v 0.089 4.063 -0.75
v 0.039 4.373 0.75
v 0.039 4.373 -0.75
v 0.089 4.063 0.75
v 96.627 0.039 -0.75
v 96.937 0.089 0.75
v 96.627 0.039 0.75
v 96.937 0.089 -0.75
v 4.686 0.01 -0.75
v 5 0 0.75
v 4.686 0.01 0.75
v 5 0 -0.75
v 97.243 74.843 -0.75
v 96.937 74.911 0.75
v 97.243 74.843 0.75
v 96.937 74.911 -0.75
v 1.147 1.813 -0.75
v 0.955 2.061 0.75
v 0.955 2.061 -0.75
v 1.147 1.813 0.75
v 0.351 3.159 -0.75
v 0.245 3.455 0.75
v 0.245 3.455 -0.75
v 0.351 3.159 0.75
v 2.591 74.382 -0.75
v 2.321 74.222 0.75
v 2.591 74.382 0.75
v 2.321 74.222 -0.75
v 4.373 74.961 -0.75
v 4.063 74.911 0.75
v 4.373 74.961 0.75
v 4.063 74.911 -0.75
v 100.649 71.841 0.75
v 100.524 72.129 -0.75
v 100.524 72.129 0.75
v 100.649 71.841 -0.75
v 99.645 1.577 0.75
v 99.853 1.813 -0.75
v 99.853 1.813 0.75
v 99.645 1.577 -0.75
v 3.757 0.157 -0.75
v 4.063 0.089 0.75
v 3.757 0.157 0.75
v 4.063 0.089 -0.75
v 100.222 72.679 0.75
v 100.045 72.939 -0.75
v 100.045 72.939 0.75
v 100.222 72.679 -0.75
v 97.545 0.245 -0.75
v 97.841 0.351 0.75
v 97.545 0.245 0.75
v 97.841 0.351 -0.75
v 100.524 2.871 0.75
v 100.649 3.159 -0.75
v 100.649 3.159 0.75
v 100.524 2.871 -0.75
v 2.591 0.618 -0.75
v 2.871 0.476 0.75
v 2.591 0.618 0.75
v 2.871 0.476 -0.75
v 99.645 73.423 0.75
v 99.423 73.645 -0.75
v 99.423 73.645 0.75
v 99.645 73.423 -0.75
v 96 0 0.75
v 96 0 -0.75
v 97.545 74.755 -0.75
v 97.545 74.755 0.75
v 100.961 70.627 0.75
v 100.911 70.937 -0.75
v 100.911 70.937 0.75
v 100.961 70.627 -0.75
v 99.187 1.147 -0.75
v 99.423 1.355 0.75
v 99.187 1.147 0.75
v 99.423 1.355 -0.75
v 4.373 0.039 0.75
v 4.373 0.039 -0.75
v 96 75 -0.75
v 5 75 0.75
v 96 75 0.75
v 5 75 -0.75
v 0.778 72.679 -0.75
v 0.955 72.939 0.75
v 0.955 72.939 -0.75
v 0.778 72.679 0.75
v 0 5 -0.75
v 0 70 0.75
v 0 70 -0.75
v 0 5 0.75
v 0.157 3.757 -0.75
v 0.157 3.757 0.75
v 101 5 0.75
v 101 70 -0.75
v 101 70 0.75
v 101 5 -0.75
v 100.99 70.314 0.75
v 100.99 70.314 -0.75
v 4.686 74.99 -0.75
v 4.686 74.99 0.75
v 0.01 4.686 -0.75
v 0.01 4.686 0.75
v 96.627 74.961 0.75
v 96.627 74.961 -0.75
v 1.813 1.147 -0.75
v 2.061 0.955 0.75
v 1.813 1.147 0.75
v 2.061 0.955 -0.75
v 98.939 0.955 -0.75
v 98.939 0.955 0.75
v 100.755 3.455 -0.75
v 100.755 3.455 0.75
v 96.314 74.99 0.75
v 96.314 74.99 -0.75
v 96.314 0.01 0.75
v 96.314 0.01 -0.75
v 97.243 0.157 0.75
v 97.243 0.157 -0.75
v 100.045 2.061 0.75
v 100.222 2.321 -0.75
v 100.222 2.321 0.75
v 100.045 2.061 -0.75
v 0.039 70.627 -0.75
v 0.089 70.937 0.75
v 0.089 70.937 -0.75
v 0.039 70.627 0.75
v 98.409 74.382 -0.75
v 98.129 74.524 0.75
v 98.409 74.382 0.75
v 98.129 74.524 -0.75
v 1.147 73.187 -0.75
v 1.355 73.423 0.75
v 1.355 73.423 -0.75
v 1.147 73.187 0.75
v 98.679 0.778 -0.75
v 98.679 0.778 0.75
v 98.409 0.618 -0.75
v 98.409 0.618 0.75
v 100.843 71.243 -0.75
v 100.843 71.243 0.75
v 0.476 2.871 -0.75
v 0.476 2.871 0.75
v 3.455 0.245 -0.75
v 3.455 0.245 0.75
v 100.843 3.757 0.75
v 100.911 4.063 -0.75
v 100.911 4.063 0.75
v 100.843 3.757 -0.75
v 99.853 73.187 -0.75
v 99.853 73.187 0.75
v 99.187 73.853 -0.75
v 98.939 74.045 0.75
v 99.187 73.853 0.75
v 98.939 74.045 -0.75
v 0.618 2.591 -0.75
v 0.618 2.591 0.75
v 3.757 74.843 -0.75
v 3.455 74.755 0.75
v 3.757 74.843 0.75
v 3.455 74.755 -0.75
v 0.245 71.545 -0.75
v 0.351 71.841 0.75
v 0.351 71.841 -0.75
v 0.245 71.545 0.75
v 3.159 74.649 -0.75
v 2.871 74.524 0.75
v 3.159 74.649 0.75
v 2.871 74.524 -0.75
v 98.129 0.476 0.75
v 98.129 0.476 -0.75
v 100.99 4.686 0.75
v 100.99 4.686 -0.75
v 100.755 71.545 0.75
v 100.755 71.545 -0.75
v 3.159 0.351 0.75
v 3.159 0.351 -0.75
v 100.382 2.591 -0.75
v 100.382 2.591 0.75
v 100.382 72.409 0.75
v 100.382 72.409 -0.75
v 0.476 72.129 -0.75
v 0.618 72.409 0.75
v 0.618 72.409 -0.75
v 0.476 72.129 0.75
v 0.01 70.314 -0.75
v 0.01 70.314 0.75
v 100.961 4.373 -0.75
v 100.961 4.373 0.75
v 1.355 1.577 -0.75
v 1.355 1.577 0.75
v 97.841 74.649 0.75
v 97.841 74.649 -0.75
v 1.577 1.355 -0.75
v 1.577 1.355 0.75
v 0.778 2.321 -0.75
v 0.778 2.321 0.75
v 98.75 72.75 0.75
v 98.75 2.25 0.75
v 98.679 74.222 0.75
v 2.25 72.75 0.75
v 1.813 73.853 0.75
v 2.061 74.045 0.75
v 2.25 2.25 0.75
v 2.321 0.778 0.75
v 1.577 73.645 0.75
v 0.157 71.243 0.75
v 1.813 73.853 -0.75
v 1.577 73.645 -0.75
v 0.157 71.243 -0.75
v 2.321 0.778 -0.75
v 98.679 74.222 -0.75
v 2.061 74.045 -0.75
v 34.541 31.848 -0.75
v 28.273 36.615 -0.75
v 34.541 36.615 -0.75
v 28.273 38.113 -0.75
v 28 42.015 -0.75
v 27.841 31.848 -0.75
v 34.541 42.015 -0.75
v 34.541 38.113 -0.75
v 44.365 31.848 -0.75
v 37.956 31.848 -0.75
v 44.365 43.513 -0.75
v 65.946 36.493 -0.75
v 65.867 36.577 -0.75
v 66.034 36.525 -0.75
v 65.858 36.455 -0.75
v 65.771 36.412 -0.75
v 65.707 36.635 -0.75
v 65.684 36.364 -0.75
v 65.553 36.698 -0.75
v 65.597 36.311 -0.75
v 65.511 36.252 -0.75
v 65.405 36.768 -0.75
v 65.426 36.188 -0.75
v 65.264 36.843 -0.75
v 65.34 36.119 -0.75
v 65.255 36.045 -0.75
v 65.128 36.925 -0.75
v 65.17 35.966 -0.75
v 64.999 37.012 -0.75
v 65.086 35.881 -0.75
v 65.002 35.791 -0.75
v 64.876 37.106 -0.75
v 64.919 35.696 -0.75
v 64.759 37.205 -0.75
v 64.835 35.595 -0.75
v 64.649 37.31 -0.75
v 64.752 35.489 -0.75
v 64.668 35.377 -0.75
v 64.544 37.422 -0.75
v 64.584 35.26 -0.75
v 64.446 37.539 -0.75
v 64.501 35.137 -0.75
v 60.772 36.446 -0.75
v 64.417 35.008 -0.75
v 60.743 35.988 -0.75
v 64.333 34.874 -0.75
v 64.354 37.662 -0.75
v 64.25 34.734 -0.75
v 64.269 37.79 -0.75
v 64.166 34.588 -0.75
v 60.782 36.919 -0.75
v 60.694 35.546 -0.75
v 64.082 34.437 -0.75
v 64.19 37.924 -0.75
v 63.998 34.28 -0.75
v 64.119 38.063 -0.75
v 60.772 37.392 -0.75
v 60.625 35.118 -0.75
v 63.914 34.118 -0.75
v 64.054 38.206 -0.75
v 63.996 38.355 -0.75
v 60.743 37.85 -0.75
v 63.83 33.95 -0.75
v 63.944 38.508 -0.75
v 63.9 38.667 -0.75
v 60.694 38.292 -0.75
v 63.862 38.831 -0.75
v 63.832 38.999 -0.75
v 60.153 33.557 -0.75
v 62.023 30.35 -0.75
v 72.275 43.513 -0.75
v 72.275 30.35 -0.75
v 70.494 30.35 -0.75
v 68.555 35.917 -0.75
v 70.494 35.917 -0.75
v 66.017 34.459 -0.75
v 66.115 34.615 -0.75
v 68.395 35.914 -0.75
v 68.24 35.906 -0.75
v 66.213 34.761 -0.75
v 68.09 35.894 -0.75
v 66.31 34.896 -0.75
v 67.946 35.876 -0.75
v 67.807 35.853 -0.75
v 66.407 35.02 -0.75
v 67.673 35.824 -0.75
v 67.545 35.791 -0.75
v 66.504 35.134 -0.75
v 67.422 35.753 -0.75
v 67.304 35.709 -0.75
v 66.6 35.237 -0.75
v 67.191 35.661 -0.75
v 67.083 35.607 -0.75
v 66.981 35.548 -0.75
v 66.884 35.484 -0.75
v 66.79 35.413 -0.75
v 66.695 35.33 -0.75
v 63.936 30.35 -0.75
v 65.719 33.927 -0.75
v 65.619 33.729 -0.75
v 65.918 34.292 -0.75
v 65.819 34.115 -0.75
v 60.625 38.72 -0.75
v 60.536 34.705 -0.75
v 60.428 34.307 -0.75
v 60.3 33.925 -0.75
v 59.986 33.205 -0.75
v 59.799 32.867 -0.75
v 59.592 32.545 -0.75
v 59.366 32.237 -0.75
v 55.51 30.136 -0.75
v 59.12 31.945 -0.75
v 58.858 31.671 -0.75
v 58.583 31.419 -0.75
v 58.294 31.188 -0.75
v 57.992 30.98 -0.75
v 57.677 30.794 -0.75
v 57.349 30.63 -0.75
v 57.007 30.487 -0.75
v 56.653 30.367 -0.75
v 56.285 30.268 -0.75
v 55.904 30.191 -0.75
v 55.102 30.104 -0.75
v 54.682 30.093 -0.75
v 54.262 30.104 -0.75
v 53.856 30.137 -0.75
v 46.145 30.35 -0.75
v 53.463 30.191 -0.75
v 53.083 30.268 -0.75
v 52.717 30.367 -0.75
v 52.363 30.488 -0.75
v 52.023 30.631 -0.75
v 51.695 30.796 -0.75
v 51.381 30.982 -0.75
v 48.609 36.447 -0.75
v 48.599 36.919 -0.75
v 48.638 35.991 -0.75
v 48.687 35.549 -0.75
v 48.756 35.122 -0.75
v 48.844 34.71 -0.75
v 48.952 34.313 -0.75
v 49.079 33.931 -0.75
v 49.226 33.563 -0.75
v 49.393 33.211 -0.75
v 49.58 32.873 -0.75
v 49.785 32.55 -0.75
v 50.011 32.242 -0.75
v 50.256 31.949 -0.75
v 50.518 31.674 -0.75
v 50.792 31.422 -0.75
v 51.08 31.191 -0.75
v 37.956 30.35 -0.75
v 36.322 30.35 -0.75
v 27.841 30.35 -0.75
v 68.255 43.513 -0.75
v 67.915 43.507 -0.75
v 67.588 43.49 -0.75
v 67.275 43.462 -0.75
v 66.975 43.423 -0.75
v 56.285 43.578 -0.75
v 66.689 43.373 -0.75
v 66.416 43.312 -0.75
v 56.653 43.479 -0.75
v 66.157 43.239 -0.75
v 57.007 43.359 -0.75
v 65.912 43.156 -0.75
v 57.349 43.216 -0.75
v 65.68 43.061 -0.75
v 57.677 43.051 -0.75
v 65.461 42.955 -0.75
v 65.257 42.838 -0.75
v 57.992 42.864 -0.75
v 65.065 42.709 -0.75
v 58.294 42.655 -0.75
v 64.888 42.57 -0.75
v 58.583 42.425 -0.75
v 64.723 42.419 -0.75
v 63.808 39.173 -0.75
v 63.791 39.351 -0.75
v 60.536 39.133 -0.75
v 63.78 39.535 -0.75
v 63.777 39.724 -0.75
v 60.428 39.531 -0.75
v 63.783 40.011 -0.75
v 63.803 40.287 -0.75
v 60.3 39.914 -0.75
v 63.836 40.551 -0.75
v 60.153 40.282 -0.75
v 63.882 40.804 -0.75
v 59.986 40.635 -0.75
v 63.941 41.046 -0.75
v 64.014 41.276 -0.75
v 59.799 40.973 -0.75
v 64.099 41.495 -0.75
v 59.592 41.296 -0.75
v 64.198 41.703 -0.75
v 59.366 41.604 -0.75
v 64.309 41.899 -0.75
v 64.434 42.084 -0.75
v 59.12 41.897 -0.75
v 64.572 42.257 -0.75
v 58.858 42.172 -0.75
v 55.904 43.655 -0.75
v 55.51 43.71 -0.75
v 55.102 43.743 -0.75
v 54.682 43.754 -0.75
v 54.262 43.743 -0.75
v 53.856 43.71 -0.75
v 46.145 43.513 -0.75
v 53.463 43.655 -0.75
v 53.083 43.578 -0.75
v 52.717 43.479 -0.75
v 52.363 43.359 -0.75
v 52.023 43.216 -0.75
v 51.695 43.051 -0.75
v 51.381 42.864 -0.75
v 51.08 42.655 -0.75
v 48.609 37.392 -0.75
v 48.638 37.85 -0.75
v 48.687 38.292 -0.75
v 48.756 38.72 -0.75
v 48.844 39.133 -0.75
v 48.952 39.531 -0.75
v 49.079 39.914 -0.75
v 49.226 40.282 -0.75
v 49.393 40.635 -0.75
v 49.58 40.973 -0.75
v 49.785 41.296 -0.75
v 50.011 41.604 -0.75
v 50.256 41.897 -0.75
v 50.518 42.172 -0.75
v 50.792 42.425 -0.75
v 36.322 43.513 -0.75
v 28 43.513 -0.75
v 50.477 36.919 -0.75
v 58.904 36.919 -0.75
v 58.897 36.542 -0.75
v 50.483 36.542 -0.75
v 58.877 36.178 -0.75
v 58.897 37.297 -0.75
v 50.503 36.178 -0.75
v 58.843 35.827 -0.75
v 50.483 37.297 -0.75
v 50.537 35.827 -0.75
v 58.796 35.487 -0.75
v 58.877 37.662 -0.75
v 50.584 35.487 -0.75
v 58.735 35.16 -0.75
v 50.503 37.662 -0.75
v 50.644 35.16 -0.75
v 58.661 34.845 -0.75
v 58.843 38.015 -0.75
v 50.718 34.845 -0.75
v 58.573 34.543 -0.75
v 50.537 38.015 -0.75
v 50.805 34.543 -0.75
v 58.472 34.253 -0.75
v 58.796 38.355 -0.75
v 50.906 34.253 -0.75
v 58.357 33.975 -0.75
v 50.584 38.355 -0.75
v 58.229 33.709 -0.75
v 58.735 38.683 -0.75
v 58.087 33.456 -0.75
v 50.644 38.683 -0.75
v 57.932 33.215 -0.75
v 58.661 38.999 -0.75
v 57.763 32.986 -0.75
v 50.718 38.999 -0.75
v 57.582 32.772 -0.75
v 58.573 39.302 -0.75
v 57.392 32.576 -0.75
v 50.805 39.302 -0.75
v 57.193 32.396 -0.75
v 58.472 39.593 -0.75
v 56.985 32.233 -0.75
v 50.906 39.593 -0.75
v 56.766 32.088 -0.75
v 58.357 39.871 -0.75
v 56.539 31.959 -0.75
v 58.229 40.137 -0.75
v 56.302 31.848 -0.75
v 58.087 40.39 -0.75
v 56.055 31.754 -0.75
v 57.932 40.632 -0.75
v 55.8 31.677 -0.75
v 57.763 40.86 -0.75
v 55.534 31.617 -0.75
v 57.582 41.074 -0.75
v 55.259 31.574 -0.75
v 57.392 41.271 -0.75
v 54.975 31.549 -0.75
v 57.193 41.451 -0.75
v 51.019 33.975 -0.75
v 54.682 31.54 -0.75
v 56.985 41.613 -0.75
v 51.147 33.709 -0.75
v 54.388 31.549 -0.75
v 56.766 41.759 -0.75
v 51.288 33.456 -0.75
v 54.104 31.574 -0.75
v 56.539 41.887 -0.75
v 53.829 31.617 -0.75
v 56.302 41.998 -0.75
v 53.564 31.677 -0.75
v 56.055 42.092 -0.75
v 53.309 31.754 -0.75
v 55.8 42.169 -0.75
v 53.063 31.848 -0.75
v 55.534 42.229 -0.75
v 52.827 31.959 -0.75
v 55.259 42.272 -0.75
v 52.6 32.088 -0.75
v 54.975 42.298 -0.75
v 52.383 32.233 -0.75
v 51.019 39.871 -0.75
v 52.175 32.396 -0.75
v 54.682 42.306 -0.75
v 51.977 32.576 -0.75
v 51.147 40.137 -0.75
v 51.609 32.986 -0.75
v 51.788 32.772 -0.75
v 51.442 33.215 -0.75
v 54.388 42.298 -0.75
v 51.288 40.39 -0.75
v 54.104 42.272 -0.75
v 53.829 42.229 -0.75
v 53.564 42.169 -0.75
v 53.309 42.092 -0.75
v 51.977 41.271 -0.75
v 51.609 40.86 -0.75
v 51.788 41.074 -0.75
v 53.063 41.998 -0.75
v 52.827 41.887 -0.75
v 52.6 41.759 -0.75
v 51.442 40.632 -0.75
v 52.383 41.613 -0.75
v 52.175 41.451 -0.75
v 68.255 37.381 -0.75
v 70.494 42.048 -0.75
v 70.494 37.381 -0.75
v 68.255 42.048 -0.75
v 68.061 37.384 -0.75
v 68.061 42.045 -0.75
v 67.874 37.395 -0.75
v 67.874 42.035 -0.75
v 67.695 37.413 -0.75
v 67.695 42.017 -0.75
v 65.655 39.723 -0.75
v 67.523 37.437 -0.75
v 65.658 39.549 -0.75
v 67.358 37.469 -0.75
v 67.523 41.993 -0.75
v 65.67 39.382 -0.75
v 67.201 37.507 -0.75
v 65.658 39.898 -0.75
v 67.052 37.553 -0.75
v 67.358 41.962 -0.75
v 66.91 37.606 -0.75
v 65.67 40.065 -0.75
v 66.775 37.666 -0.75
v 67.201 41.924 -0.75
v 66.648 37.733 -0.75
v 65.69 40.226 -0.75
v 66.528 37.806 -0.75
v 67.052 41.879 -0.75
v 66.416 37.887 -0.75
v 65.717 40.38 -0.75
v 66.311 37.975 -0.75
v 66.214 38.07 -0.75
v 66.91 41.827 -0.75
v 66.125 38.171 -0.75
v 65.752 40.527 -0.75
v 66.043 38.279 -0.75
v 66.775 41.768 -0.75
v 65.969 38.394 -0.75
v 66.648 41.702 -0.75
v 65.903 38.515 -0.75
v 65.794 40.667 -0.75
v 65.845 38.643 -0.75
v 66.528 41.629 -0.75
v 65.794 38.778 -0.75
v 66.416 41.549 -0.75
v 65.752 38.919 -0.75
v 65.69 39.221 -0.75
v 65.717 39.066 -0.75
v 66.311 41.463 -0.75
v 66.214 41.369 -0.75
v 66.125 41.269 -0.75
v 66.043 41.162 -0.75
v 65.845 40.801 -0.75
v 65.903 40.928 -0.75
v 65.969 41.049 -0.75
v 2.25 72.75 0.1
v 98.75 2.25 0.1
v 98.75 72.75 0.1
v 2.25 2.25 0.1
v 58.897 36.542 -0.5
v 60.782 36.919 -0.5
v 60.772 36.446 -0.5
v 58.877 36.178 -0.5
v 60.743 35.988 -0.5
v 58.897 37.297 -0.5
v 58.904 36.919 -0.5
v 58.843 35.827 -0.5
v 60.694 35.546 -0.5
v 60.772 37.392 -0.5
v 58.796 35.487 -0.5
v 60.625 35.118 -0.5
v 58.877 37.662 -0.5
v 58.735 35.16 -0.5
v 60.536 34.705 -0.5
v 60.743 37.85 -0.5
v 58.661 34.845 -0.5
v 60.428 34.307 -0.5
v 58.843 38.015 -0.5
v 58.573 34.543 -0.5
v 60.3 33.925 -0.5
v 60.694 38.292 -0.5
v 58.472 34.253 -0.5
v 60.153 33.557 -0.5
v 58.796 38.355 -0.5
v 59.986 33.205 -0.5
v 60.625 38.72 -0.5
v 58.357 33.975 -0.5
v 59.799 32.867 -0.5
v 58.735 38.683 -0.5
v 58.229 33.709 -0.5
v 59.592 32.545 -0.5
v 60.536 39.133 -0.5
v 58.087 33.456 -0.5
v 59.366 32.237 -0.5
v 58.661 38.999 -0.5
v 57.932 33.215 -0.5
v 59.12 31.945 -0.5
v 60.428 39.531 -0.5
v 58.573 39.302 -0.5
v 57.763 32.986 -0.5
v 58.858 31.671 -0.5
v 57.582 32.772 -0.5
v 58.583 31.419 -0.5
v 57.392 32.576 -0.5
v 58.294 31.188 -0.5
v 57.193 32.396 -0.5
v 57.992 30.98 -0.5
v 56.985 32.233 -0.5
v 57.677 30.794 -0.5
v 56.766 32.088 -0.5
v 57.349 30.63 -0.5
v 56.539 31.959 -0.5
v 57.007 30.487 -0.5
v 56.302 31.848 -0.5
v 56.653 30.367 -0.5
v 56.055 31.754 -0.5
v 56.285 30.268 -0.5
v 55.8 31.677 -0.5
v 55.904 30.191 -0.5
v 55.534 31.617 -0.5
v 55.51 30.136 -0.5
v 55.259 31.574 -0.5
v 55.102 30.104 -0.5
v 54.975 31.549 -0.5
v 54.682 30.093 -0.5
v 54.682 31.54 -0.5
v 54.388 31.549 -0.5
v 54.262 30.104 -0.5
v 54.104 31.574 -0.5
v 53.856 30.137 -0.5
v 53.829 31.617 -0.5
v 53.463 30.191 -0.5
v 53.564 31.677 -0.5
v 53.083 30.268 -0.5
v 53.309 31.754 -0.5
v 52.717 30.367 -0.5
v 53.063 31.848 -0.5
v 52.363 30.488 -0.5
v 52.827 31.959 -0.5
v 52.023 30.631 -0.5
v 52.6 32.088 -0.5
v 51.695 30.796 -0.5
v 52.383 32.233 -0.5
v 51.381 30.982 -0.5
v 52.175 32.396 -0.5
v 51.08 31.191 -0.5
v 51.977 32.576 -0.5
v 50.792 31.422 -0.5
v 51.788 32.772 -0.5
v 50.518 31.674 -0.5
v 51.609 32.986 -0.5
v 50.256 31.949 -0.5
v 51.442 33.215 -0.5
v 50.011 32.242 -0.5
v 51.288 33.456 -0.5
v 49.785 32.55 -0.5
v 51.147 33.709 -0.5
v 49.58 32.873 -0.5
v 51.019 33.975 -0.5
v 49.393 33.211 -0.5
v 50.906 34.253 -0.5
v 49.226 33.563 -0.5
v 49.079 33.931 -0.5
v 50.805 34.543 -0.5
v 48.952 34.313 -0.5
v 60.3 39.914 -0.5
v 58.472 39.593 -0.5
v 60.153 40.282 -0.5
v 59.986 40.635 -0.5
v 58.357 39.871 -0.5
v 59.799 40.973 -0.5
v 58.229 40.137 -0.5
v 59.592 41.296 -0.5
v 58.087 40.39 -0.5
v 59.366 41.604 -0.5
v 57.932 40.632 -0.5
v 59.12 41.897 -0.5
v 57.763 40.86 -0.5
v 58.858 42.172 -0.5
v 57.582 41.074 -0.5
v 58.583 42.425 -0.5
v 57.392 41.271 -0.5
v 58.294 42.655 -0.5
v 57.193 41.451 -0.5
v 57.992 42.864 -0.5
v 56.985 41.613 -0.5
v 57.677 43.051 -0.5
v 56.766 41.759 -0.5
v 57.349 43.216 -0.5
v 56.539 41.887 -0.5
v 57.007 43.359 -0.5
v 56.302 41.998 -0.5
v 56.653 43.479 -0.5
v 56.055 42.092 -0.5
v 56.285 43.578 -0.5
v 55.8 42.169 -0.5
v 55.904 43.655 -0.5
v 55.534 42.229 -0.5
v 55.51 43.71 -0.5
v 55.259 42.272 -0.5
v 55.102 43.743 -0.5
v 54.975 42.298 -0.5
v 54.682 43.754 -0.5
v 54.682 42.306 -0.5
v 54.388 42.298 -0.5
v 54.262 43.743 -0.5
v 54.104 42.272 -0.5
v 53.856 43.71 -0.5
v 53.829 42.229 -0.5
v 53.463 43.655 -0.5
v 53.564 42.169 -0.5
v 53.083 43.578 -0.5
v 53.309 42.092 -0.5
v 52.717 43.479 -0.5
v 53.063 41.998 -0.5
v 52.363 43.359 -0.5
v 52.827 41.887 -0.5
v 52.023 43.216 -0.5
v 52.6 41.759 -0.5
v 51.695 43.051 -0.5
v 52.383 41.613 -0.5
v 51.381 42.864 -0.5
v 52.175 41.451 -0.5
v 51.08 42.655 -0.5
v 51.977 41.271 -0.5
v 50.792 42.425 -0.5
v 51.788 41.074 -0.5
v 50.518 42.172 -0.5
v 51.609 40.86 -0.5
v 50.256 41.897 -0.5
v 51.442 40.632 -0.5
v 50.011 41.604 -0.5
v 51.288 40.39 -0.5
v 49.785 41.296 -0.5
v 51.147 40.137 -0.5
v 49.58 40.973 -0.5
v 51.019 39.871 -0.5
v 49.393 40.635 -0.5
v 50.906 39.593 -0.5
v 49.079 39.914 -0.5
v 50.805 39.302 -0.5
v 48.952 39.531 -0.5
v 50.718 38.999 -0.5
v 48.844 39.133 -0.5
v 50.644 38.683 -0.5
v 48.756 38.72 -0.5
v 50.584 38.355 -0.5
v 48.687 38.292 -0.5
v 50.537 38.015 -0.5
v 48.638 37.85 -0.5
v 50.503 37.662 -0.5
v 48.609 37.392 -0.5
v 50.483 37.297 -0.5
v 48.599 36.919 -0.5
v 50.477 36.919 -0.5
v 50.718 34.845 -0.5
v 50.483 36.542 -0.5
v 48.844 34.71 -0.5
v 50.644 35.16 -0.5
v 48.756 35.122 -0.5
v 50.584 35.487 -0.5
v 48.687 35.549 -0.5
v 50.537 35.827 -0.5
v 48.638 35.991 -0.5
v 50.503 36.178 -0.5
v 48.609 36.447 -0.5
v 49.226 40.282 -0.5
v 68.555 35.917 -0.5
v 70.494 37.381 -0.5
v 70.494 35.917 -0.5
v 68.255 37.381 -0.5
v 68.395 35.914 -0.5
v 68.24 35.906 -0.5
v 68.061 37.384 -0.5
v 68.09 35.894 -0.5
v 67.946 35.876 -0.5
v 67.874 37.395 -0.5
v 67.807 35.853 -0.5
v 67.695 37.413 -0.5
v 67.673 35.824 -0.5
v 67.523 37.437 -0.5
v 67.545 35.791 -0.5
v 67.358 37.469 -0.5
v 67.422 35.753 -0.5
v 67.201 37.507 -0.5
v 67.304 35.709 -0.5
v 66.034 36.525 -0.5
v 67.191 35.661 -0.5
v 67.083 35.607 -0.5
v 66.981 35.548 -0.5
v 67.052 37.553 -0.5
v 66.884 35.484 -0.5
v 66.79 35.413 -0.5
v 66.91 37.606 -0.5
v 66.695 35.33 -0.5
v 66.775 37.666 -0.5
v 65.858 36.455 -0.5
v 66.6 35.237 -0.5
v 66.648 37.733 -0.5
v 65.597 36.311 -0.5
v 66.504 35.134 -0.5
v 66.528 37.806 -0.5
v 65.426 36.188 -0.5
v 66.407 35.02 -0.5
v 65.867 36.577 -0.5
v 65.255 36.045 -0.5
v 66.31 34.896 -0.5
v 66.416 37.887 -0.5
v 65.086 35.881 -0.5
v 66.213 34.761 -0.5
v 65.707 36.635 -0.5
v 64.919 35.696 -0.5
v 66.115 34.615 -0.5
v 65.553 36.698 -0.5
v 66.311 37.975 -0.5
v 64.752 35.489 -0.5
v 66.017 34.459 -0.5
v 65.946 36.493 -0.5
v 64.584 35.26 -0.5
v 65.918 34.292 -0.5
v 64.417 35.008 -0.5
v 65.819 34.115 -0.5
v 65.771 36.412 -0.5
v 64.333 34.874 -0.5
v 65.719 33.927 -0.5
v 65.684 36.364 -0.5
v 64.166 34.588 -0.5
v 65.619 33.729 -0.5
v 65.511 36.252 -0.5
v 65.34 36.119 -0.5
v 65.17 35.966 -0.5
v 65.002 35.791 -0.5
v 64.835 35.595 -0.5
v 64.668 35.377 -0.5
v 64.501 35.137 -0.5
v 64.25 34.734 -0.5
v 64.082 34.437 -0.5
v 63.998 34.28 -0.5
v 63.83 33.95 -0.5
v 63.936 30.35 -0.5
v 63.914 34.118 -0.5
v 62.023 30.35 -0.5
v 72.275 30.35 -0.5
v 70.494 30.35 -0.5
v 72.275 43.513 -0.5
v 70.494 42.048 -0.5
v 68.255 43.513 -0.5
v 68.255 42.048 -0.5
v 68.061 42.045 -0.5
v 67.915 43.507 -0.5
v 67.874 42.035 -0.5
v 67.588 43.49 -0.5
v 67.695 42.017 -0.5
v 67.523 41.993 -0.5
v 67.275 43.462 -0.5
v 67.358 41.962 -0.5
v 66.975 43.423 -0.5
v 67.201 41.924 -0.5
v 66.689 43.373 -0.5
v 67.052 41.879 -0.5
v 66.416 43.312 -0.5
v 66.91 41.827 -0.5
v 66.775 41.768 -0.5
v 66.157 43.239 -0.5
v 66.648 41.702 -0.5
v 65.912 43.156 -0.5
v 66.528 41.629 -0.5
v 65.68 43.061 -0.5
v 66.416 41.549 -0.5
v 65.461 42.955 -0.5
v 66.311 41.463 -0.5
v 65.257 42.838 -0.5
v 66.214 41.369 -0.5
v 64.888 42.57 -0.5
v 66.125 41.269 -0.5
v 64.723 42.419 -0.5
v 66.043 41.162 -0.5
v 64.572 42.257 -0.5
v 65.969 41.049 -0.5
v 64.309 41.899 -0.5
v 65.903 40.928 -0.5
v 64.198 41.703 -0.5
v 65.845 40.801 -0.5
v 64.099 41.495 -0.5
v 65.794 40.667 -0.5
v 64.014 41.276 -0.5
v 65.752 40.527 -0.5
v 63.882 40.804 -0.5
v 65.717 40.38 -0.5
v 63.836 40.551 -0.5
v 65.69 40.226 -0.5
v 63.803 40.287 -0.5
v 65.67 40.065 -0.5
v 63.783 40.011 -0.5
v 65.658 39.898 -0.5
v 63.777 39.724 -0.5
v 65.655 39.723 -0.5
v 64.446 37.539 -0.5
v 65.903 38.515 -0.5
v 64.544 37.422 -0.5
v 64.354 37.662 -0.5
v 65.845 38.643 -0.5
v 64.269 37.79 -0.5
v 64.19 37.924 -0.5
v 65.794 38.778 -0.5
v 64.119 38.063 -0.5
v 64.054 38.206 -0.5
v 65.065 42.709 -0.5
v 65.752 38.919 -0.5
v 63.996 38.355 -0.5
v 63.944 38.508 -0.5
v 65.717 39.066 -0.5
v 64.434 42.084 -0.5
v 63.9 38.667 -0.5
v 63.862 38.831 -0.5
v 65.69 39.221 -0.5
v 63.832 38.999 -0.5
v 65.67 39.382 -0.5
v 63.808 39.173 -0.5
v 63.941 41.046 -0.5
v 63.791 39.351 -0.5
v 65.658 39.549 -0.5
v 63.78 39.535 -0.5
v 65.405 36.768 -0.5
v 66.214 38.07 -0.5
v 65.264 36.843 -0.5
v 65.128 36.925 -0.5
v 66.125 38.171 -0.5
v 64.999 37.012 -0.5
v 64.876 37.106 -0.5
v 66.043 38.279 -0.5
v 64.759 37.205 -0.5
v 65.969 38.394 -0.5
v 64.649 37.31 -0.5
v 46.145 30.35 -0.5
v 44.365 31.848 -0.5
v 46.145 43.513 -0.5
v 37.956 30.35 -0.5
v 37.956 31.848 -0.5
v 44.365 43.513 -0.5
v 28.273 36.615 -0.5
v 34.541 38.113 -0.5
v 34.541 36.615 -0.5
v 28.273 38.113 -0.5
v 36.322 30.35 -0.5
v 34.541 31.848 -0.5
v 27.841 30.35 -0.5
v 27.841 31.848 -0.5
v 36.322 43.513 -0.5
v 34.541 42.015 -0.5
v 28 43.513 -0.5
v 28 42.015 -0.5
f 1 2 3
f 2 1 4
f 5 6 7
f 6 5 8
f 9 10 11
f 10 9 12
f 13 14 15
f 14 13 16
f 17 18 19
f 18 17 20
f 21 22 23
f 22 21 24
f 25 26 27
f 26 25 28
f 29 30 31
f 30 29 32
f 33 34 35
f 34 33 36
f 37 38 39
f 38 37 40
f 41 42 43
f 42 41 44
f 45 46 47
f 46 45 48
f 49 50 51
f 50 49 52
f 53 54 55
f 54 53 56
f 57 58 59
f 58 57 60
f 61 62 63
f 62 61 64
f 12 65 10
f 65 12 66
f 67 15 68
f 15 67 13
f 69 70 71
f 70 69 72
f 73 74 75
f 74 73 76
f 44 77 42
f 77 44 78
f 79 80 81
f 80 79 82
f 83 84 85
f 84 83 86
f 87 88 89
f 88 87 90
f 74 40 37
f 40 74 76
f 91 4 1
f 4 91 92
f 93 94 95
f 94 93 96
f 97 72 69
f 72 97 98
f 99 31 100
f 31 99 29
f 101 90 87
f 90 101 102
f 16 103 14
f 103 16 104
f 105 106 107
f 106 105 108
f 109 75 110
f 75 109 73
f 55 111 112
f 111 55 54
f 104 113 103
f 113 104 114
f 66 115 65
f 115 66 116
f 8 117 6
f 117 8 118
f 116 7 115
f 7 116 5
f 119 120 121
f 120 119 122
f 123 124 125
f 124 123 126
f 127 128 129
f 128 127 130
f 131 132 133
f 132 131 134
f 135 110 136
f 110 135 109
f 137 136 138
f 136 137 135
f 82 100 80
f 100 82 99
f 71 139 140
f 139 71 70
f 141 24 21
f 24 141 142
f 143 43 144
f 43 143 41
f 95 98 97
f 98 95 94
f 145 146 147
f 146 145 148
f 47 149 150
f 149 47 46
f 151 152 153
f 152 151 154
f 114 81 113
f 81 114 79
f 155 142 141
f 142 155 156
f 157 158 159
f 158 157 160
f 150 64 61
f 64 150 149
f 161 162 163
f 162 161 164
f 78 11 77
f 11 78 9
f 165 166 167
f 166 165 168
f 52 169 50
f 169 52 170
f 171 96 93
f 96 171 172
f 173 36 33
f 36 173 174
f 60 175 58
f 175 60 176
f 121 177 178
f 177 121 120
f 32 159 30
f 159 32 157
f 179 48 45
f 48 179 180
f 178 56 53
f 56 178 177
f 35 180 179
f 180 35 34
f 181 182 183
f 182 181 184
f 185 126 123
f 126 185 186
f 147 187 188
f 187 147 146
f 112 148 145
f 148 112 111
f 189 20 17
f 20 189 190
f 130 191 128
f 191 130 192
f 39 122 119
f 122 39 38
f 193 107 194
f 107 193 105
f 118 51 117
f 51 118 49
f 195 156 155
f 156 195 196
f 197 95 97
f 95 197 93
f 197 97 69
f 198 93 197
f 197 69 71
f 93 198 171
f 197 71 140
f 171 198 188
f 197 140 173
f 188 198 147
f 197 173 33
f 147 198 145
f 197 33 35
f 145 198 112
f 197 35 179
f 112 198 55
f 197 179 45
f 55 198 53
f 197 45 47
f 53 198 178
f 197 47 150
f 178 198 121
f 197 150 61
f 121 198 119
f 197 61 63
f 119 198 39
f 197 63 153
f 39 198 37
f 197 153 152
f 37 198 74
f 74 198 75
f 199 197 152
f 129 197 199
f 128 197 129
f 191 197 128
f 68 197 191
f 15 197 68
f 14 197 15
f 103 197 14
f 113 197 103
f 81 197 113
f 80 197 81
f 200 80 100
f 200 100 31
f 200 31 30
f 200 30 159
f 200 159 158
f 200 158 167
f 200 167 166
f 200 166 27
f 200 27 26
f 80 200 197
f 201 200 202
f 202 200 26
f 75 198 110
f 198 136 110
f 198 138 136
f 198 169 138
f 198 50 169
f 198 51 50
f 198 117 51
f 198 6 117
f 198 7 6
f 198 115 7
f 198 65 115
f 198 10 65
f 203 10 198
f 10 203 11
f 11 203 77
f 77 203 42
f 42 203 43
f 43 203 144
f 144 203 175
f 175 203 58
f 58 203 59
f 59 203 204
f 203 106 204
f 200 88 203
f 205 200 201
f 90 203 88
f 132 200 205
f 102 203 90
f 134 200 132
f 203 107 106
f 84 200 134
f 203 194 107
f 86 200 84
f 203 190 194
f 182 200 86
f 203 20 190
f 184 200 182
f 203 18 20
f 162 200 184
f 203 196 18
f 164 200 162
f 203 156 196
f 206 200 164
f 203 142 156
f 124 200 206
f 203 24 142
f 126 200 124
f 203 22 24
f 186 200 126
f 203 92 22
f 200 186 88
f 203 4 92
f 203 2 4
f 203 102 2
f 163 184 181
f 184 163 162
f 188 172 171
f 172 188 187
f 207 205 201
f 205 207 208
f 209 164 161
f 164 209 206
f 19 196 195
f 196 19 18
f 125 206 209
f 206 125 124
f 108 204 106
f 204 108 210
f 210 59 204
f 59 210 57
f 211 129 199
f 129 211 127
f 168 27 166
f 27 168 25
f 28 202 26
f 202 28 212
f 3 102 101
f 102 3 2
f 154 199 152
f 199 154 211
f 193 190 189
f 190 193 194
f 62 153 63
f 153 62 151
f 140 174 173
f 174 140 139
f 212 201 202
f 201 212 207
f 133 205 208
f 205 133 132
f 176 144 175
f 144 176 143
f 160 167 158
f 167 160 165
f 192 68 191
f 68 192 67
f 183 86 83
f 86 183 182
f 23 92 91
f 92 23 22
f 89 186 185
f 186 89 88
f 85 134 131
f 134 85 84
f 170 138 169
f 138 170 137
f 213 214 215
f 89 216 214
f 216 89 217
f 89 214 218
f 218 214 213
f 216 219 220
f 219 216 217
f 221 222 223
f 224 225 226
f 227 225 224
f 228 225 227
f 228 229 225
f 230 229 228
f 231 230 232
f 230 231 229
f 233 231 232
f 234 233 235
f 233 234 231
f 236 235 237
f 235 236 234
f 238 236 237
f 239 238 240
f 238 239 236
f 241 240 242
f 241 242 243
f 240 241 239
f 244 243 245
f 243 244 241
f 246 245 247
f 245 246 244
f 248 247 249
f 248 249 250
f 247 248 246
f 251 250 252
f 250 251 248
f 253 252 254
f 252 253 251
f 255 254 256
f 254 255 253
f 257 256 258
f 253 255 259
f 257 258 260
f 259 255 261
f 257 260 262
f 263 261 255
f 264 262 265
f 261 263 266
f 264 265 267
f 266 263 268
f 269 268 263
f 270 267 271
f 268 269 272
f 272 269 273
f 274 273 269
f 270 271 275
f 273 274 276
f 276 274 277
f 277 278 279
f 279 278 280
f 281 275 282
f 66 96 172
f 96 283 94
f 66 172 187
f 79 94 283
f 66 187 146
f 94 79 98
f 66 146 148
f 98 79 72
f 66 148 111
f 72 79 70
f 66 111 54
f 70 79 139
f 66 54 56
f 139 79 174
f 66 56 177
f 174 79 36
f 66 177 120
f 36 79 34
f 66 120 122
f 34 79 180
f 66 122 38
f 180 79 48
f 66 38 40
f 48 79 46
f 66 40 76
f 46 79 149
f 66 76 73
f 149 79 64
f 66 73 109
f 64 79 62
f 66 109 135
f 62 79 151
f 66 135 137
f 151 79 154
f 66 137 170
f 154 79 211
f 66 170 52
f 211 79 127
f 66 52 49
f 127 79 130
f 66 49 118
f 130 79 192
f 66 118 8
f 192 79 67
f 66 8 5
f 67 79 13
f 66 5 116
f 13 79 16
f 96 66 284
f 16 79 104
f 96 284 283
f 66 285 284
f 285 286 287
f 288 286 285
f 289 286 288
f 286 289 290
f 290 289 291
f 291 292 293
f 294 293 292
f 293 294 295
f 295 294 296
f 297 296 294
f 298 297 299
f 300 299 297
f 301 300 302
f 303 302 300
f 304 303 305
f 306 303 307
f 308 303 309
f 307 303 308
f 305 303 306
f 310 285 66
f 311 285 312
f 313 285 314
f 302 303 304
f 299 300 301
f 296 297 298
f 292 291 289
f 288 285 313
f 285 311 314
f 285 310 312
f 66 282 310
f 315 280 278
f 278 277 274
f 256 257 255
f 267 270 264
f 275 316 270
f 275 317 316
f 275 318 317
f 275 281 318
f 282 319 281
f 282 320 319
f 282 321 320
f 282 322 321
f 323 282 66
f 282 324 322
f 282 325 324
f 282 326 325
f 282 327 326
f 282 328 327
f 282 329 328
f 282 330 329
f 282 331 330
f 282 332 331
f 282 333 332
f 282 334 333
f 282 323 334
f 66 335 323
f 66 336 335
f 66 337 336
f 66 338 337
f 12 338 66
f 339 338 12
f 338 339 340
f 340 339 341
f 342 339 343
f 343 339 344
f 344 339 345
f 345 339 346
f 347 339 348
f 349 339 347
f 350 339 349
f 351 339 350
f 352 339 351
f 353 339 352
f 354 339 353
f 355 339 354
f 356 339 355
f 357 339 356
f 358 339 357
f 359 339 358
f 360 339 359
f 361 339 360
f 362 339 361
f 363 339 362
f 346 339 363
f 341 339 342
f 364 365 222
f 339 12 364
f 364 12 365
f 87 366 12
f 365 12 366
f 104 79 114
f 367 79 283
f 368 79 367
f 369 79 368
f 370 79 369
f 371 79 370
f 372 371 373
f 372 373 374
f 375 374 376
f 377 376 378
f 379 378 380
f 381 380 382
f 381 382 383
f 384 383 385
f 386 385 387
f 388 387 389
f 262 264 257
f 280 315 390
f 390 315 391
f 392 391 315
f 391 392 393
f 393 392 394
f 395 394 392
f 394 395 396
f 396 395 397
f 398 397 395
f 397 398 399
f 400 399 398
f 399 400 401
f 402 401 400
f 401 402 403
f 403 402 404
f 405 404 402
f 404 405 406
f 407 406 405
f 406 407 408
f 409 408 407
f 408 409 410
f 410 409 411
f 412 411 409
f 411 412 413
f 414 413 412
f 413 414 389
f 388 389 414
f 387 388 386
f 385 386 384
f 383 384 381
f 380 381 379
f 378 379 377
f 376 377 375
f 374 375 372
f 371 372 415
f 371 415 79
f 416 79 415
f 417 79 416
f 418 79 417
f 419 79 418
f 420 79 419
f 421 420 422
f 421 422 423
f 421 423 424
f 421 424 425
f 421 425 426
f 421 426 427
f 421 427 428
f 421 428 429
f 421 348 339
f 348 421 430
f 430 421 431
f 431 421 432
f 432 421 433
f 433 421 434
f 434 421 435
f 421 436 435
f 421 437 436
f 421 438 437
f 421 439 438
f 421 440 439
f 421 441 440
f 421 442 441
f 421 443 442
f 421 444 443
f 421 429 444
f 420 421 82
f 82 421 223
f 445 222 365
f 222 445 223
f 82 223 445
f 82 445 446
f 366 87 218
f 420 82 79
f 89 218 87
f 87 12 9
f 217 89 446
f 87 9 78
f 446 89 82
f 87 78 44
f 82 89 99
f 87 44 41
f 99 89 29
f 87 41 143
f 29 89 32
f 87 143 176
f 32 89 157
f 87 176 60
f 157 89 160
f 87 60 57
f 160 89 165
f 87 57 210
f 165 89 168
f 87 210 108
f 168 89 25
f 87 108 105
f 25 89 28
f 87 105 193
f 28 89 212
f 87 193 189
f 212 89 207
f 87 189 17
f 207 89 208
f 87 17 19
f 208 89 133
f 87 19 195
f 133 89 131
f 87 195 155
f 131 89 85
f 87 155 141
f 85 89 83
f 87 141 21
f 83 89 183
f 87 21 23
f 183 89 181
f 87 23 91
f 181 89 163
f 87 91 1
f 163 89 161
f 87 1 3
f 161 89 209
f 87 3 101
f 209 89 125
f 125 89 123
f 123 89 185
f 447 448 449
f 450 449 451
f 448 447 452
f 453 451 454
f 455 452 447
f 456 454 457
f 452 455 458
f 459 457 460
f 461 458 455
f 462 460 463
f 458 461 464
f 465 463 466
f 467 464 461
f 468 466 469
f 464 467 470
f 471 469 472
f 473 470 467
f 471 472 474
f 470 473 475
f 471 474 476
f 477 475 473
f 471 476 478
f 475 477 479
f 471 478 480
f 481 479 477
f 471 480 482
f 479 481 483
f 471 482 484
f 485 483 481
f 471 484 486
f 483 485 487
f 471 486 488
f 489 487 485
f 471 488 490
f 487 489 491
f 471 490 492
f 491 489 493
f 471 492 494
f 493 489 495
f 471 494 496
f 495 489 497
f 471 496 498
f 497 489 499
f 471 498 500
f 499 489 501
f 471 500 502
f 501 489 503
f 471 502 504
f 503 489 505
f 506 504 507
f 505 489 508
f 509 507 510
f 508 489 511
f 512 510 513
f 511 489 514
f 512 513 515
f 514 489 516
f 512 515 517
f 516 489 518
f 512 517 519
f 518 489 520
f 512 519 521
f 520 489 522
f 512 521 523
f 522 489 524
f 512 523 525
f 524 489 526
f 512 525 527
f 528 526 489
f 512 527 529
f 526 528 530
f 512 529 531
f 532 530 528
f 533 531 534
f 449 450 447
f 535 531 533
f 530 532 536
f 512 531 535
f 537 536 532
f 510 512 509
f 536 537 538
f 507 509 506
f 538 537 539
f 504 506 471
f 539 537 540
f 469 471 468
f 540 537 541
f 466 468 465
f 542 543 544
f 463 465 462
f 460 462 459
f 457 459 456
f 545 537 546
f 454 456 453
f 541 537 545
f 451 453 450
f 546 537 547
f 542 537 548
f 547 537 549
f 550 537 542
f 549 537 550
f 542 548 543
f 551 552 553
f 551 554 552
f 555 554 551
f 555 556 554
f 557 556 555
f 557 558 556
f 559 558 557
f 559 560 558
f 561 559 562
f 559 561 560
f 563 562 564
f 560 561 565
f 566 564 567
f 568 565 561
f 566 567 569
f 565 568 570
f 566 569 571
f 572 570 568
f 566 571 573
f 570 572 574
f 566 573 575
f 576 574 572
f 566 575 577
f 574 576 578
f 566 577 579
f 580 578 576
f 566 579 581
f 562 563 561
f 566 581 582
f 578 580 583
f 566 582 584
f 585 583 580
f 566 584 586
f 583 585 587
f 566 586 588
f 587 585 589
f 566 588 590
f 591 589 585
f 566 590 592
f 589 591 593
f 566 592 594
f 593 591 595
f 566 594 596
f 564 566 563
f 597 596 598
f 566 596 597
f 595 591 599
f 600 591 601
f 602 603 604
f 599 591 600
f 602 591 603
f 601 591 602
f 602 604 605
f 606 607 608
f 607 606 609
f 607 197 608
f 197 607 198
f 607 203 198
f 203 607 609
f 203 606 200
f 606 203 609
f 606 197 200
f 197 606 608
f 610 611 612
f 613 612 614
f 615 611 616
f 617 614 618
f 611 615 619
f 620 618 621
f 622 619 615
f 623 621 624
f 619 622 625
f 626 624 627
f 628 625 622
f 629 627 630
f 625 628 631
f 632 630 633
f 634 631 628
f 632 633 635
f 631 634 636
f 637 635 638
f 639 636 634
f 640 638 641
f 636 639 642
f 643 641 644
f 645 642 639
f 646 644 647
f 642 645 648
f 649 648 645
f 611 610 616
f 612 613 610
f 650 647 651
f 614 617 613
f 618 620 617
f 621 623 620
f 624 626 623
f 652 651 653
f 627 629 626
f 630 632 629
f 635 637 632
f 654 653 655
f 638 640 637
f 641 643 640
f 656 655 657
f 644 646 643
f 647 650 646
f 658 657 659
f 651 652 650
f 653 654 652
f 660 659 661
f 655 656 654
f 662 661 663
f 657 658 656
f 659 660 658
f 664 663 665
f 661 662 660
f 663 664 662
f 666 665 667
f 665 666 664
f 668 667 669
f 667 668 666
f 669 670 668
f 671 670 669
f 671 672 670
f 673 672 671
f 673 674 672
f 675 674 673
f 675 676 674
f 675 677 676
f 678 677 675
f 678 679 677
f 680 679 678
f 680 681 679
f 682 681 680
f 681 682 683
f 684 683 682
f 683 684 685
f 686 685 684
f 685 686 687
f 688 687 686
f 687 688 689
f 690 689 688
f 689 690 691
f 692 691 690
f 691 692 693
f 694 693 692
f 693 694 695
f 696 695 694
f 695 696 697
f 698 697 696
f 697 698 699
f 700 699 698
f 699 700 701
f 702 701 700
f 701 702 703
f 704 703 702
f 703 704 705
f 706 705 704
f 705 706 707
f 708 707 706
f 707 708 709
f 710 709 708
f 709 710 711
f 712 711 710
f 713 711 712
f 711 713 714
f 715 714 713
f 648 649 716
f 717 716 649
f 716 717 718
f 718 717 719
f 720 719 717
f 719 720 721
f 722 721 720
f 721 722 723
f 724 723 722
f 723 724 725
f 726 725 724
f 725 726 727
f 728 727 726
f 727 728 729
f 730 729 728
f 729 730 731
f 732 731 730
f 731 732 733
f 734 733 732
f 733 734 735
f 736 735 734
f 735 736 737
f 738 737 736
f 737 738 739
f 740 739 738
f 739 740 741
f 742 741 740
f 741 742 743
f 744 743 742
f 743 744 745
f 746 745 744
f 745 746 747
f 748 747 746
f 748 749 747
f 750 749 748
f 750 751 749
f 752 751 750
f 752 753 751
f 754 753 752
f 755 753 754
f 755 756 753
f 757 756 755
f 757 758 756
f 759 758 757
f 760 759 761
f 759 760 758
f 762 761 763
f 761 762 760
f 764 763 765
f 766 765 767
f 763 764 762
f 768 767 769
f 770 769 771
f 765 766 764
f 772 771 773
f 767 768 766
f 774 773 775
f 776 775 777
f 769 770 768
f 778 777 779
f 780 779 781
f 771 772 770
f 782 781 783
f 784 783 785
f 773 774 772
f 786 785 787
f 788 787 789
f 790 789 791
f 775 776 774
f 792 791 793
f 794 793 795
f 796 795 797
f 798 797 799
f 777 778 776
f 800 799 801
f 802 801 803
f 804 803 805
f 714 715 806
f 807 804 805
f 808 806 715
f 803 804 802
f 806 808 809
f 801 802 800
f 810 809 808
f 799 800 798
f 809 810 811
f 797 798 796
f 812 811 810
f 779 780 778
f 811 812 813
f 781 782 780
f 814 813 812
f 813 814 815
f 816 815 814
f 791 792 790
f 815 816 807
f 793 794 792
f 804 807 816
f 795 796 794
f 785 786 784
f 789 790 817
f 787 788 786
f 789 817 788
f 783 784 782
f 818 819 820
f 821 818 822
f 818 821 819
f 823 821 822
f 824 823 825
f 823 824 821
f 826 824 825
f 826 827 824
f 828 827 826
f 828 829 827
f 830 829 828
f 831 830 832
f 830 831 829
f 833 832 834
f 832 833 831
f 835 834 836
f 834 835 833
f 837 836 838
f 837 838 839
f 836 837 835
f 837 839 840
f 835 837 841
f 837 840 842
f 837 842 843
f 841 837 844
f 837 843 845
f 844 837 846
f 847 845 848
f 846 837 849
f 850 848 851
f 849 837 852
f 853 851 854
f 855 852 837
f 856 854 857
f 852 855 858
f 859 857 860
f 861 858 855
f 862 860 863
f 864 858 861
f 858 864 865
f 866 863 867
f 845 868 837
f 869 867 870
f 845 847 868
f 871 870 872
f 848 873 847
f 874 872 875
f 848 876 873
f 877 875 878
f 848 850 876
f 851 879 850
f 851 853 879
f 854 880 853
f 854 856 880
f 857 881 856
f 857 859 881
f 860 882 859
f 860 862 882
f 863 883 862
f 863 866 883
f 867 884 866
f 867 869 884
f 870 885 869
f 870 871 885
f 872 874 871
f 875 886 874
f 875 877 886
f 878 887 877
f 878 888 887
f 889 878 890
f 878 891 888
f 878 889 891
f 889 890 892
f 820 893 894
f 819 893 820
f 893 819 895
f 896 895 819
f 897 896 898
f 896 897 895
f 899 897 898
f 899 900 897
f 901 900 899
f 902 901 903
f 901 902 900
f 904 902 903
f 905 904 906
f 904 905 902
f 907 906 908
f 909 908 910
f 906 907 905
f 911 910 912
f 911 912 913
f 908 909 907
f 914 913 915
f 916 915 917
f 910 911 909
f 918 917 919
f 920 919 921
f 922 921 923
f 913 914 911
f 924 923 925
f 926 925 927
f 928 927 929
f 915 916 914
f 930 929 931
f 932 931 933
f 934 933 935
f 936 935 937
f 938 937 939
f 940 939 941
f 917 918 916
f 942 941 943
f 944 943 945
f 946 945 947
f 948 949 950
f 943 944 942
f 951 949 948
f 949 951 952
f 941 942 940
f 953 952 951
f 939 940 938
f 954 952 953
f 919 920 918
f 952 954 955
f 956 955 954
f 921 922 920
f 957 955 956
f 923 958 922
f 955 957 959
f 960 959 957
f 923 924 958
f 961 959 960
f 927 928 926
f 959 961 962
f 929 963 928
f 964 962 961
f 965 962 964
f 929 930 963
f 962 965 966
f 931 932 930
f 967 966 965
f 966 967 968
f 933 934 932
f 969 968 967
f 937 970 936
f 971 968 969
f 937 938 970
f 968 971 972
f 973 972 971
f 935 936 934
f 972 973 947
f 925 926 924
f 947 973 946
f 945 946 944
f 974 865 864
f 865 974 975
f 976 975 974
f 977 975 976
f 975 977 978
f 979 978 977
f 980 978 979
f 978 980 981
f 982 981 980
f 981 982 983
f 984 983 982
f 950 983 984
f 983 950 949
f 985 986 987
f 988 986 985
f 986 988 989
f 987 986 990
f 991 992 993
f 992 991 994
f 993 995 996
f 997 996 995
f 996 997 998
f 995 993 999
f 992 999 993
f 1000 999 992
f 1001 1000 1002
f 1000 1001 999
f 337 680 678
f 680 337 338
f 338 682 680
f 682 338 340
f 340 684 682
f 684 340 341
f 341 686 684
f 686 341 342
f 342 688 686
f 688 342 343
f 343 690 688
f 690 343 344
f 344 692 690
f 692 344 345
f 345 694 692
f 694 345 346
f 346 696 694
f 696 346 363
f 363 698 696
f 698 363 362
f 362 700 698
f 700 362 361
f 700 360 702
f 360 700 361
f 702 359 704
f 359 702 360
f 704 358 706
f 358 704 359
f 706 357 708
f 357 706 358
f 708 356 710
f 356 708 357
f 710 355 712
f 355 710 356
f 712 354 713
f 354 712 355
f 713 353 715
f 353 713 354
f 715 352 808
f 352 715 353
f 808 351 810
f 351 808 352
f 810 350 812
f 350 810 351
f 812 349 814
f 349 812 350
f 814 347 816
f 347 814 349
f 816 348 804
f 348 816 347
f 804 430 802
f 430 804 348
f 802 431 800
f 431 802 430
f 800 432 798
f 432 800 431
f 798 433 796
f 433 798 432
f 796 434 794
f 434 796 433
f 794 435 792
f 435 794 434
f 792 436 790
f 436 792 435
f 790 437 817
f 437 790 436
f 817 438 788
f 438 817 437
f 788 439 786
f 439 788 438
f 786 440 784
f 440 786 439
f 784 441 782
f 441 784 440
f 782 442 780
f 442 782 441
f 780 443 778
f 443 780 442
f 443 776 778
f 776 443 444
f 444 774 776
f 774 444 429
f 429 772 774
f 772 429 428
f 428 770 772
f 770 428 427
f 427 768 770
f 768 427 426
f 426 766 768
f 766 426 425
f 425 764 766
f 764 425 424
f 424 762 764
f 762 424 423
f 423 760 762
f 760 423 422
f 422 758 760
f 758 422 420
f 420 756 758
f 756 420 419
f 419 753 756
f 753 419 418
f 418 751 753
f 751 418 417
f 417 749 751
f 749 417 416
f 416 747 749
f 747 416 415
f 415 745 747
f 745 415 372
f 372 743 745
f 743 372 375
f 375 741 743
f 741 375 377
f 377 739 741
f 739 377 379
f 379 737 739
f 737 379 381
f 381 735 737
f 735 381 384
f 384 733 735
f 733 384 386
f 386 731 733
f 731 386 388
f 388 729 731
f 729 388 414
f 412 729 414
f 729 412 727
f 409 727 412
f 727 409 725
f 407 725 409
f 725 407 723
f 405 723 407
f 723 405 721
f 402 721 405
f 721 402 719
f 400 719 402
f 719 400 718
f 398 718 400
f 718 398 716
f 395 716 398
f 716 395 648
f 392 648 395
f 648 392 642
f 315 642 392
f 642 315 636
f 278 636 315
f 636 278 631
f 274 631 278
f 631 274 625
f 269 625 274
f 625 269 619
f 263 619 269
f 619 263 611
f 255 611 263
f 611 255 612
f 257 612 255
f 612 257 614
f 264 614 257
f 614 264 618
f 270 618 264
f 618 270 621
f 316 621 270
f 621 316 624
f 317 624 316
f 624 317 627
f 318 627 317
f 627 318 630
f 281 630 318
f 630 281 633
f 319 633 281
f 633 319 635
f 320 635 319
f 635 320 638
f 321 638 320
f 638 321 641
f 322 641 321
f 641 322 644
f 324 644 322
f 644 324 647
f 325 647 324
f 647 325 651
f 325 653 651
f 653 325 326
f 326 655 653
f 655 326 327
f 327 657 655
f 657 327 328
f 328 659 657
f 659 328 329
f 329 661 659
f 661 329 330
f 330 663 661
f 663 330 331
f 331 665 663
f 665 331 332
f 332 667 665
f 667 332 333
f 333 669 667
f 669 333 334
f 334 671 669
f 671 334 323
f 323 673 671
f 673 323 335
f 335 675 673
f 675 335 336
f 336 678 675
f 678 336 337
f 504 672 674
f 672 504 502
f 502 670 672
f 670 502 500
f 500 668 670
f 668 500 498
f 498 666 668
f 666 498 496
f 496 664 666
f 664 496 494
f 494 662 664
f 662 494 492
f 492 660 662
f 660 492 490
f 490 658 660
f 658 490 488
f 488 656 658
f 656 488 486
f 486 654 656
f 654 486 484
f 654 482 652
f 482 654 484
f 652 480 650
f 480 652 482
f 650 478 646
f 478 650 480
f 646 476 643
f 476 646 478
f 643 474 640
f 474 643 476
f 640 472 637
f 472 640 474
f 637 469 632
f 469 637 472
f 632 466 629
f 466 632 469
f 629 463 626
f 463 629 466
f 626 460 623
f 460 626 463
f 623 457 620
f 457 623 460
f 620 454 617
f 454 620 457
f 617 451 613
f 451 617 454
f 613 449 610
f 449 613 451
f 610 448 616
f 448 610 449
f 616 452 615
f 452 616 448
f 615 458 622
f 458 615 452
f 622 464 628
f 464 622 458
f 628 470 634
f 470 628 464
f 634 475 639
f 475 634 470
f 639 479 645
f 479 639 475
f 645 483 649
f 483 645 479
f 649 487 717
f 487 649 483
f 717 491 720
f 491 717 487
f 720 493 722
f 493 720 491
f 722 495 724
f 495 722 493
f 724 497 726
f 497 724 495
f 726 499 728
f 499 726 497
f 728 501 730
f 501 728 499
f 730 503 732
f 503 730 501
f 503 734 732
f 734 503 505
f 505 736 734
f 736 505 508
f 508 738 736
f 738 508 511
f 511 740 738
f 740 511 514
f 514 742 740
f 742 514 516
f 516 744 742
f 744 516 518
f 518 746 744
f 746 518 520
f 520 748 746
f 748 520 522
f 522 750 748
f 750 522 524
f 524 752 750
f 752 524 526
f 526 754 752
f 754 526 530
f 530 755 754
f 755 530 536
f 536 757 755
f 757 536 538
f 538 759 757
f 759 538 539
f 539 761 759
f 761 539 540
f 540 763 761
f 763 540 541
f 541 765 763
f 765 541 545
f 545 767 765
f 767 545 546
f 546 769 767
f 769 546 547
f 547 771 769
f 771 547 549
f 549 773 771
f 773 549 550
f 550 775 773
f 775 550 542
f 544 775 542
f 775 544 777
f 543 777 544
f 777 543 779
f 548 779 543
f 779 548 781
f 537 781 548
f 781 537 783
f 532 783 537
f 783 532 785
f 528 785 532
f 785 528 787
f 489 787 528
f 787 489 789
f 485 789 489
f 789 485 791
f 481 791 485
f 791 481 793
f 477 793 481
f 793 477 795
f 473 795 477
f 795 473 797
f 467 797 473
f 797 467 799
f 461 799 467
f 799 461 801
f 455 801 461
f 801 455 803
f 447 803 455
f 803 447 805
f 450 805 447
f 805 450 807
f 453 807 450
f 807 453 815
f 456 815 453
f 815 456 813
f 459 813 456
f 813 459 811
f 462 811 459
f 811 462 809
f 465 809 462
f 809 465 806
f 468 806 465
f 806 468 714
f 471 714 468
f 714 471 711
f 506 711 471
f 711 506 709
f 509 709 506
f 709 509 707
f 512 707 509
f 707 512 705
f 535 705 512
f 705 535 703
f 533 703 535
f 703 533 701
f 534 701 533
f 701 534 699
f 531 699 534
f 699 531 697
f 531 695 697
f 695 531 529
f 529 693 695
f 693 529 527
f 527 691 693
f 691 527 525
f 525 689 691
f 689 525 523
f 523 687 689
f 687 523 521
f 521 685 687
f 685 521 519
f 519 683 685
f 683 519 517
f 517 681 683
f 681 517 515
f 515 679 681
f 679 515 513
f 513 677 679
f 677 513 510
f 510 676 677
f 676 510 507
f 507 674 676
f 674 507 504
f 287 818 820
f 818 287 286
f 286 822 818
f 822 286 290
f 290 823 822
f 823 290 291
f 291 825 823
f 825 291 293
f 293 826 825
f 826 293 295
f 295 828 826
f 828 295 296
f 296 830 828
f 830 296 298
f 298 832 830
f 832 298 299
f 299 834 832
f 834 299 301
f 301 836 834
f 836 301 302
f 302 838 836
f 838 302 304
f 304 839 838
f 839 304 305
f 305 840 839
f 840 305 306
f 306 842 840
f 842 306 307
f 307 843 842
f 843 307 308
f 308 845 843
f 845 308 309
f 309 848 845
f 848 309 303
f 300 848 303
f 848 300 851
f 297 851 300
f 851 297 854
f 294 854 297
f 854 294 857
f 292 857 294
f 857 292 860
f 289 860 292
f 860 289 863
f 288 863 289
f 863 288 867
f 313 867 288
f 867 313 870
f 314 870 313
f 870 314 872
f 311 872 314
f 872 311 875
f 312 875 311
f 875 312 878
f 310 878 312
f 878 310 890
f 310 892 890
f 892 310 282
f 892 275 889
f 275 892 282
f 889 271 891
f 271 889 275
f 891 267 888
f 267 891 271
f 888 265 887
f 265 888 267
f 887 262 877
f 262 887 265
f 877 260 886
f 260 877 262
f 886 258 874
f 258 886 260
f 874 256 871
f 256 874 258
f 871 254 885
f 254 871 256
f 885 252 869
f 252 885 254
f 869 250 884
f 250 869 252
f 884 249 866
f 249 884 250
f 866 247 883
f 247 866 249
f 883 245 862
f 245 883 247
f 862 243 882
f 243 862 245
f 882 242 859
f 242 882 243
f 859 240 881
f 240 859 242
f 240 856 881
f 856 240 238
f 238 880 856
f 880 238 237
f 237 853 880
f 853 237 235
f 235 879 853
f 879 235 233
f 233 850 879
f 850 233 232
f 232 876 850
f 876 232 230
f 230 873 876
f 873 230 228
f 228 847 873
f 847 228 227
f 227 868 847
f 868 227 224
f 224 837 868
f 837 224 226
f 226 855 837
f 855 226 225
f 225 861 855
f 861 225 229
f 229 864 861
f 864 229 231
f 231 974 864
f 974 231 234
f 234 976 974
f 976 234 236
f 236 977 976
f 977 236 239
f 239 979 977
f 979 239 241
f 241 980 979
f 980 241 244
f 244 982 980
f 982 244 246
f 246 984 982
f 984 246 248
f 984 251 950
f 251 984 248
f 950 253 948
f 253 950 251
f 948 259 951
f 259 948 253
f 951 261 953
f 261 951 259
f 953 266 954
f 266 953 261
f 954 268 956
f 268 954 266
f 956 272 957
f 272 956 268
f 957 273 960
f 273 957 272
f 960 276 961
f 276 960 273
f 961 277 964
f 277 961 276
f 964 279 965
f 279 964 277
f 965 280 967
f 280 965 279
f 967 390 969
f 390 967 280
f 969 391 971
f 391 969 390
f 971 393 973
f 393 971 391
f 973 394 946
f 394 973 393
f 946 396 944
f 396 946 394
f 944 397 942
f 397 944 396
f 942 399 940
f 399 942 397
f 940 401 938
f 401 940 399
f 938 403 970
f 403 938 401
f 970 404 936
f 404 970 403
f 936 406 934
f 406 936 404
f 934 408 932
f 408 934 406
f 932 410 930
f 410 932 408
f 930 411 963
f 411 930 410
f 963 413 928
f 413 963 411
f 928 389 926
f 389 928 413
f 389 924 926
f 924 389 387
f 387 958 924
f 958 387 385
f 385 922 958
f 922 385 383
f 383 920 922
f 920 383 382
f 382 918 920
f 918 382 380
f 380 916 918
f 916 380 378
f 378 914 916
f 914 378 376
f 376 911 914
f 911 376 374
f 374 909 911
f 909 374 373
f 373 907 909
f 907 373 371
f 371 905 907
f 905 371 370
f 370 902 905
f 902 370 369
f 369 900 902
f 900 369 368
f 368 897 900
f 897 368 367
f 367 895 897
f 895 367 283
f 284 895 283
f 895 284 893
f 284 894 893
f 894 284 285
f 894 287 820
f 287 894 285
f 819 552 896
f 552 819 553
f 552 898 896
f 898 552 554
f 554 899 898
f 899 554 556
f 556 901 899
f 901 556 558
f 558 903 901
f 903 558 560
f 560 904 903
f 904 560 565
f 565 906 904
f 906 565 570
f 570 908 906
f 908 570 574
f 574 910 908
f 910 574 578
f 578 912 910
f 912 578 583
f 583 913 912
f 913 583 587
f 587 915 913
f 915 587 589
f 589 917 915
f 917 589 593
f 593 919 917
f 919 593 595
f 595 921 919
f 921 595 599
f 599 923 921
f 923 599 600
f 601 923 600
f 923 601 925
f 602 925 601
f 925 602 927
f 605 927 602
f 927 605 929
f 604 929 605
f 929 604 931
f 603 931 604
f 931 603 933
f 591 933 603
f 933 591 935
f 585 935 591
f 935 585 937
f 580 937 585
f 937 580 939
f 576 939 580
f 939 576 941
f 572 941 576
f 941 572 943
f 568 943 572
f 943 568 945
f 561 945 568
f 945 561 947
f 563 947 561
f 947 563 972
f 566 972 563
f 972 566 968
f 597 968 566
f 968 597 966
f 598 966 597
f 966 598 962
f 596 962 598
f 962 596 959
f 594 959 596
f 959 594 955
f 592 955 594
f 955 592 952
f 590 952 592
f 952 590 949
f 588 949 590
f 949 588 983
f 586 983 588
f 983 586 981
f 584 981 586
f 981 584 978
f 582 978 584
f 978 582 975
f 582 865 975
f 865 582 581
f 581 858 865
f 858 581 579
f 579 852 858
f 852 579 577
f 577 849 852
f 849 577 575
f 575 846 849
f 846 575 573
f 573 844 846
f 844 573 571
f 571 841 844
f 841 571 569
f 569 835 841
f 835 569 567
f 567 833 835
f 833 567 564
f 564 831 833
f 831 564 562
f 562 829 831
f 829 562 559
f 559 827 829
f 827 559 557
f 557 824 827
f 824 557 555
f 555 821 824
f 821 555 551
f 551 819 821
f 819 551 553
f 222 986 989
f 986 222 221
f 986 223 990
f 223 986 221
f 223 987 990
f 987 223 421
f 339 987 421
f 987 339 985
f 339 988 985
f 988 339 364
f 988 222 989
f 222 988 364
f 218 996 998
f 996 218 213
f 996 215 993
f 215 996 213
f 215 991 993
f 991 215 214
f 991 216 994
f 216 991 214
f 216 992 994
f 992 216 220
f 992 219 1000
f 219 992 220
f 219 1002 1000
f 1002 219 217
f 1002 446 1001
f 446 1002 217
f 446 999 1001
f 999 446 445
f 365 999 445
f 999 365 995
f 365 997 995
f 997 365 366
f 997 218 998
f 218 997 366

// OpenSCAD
// Parameters
$fn = 100; // High value to make circles appear as circles
width = 101; // Width of the rectangle
height = 75; // Height of the rectangle
border_thickness = 1.5; // Thickness of the extruded border
radius = 5; // Radius for rounded corners
text_line_height = 13; // Height of each line of text
text_line_spacing = 4.95; // Spacing between lines of text
text_extrude_height = 1.25;
text_lines = ["ROLE"]; // Array containing the text lines

// Derived parameters
inner_width = width - 3 * border_thickness;
inner_height = height - 3 * border_thickness;
total_text_height = len(text_lines) * text_line_height + (len(text_lines) - 1) * text_line_spacing;

echo("inner_width:");
echo(inner_width);
echo("inner_height:");
echo(inner_height);

font_name = "Angkor";

// Function to create a rounded rectangle
module rounded_rectangle(w, h, r) {
    offset(r = r)
    square([w - 2 * r, h - 2 * r], center = true);
}

// Create the border by layering two rounded rectangles
translate([width/2,height/2,0])
difference() {
    linear_extrude(height = border_thickness, center = true)
    rounded_rectangle(width, height, radius); // Outer rectangle
    translate([0, 0, border_thickness+.1])
    linear_extrude(height = border_thickness * 2 , center = true)
    rounded_rectangle(inner_width, inner_height, 0); // Inner rectangle to be subtracted

scale([-1, 1, 1]) // Flipping the text
rotate(0,0,0)
for(i = [0 : len(text_lines) - 1]) {
    translate([
        0, 
        (height/total_text_height) - total_text_height/2, 
        -text_extrude_height 
    ])
    linear_extrude(height = border_thickness, center=true)
    text(text_lines[i], size = text_line_height, valign = "center", halign = "center", font = str(font_name));
}

}

// Place text lines in the middle of the rectangle
